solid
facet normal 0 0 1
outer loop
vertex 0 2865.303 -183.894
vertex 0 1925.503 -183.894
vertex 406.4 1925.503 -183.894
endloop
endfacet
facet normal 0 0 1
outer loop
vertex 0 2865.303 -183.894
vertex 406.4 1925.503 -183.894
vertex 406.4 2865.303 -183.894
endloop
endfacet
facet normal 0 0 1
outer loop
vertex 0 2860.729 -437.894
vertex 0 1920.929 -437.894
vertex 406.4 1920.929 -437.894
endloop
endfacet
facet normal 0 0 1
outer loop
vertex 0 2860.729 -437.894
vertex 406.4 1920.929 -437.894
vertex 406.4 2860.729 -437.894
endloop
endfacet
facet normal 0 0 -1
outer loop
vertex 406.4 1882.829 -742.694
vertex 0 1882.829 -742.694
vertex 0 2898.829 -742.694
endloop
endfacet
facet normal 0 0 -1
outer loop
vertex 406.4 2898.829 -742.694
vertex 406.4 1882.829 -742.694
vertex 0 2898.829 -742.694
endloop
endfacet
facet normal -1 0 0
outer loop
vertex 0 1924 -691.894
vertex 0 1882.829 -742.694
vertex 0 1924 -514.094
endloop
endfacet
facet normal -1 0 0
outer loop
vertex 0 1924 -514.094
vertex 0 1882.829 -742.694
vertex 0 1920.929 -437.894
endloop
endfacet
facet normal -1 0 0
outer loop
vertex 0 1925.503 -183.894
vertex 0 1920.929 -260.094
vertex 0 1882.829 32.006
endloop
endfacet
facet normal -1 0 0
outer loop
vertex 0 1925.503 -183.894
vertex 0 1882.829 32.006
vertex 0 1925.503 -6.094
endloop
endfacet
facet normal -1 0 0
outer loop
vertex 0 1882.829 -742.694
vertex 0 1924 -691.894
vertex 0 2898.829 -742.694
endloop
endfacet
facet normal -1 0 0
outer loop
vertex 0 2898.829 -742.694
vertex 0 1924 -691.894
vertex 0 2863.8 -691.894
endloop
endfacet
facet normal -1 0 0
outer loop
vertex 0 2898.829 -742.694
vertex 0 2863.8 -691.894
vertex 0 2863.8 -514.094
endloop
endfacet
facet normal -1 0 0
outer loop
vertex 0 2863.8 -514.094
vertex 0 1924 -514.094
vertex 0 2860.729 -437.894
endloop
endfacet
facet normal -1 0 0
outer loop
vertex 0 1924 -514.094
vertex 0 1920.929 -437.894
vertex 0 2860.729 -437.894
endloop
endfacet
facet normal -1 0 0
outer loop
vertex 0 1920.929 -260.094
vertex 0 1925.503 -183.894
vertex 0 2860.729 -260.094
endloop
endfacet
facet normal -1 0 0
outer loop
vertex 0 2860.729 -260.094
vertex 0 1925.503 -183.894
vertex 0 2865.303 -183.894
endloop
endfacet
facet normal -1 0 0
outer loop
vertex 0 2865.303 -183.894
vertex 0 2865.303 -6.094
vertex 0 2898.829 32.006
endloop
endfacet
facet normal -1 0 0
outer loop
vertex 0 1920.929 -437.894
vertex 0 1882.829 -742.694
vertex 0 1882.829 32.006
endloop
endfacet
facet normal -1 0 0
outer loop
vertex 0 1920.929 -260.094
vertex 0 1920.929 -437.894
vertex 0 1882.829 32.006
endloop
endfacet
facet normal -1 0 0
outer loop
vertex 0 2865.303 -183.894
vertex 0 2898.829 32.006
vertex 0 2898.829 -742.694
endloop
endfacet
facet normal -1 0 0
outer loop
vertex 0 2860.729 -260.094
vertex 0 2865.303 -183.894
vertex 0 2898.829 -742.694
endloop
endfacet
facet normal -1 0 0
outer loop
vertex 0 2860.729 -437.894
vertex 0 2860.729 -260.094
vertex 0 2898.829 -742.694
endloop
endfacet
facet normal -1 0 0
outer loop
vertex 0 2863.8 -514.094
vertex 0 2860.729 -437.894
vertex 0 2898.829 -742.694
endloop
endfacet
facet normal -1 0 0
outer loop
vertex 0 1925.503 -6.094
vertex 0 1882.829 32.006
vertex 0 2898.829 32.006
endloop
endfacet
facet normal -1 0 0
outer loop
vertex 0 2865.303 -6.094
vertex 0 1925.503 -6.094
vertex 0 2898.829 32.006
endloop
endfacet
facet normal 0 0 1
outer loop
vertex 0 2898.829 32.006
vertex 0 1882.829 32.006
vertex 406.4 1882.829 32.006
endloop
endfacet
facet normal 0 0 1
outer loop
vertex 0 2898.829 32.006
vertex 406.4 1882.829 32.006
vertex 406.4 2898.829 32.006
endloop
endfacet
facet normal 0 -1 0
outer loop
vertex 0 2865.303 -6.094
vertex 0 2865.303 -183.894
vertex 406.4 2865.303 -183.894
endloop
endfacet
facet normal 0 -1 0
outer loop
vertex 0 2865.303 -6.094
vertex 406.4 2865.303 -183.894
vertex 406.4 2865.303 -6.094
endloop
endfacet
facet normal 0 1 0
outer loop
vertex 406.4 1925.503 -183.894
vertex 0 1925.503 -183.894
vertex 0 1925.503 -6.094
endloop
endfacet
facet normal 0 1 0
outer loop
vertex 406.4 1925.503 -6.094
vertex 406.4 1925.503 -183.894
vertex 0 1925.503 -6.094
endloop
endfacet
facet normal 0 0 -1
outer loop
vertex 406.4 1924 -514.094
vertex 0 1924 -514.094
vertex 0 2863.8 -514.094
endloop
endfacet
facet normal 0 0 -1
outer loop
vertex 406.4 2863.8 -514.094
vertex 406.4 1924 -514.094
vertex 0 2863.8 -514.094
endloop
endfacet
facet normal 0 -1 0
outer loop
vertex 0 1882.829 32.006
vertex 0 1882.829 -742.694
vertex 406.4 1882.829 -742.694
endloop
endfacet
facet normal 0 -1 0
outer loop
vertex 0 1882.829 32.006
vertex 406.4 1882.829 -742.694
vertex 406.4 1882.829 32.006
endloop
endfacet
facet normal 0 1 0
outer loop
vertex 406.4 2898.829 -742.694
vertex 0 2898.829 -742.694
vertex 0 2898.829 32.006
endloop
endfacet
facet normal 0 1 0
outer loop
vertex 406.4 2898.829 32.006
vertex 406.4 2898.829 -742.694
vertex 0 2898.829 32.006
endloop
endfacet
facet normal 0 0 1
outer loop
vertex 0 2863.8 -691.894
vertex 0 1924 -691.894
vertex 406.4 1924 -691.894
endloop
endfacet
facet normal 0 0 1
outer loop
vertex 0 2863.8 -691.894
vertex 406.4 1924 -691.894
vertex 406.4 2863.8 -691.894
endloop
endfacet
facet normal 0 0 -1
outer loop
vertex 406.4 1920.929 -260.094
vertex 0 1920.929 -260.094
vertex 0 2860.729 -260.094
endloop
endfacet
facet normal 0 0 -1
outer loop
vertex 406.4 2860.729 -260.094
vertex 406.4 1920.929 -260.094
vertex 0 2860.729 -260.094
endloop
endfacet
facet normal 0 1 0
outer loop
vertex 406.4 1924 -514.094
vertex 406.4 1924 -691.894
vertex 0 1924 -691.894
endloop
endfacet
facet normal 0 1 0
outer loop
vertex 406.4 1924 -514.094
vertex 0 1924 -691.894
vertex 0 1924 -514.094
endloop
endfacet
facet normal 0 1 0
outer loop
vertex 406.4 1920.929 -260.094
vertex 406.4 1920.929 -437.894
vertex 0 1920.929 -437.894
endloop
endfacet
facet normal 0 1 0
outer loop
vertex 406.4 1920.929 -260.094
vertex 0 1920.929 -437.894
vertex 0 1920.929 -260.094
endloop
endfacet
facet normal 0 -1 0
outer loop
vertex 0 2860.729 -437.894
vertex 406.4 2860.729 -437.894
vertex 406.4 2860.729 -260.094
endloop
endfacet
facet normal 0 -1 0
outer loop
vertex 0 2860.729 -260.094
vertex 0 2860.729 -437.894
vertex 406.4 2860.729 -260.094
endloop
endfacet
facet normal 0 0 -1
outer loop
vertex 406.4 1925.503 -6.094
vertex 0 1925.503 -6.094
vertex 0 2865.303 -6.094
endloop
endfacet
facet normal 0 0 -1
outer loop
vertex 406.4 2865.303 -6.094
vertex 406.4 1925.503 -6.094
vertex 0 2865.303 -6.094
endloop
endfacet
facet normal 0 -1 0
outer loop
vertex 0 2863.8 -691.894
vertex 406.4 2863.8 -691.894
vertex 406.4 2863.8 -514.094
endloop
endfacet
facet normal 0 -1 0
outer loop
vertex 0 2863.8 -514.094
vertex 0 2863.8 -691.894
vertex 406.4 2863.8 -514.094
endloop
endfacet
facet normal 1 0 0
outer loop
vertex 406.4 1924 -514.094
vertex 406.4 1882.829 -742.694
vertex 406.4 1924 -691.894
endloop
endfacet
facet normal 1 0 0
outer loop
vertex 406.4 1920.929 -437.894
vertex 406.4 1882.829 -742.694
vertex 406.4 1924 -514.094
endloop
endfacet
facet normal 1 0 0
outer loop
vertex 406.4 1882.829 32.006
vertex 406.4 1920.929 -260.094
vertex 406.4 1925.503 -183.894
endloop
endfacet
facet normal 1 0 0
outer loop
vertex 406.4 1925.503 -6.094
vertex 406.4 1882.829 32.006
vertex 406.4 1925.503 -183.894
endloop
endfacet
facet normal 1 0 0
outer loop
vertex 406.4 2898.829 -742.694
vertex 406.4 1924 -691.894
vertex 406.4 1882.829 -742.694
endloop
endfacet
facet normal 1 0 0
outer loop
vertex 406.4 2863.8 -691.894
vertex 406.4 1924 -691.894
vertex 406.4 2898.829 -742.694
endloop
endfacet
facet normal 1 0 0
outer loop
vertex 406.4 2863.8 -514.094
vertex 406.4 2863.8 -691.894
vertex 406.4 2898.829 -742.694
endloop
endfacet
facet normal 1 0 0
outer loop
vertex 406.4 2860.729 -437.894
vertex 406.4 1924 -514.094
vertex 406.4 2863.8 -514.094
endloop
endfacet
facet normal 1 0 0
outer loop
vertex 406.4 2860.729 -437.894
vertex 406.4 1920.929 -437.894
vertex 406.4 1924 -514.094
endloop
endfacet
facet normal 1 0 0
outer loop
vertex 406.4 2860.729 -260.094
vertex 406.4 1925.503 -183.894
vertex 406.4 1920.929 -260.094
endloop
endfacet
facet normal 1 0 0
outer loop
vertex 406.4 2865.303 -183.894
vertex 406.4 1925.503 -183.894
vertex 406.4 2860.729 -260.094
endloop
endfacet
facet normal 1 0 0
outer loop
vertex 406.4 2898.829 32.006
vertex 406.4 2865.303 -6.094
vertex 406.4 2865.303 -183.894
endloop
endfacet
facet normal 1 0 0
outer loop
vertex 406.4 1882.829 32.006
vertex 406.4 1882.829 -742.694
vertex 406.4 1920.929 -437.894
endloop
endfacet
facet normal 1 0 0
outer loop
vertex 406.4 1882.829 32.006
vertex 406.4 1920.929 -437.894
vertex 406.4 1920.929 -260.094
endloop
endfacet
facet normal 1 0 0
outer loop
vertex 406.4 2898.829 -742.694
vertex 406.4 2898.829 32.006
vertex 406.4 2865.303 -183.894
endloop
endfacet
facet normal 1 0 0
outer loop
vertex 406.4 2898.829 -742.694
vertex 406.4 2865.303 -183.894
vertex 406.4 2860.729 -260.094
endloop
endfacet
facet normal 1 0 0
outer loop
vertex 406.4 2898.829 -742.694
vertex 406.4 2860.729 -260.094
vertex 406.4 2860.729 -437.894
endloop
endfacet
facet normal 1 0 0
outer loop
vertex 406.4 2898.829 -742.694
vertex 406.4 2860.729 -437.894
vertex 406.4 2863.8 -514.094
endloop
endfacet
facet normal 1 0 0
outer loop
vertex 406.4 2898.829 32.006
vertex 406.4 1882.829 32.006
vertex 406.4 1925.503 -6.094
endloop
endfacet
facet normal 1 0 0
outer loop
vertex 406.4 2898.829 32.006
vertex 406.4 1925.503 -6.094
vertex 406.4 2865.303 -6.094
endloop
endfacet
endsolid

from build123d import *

# Parameters (mm, degrees)
F1_W     = 1016
F1_H     = 774.7
F1_W_2   = 939.8
F1_H_2   = 177.8
F2_DEPTH = 406.4


with BuildPart() as f2:
    # F1 (on face) → F2 (new body)
    with BuildSketch(Plane.YZ):
        with Locations((2390.829132, -355.343925)):
            Rectangle(F1_W, F1_H)
        with Locations((2393.900394, -602.993925)):
            Rectangle(F1_W_2, F1_H_2, mode=Mode.SUBTRACT)
        with Locations((2390.829132, -348.993925)):
            Rectangle(F1_W_2, F1_H_2, mode=Mode.SUBTRACT)
        with Locations((2395.403147, -94.993925)):
            Rectangle(F1_W_2, F1_H_2, mode=Mode.SUBTRACT)
    extrude(amount=F2_DEPTH)


solid = f2.part
